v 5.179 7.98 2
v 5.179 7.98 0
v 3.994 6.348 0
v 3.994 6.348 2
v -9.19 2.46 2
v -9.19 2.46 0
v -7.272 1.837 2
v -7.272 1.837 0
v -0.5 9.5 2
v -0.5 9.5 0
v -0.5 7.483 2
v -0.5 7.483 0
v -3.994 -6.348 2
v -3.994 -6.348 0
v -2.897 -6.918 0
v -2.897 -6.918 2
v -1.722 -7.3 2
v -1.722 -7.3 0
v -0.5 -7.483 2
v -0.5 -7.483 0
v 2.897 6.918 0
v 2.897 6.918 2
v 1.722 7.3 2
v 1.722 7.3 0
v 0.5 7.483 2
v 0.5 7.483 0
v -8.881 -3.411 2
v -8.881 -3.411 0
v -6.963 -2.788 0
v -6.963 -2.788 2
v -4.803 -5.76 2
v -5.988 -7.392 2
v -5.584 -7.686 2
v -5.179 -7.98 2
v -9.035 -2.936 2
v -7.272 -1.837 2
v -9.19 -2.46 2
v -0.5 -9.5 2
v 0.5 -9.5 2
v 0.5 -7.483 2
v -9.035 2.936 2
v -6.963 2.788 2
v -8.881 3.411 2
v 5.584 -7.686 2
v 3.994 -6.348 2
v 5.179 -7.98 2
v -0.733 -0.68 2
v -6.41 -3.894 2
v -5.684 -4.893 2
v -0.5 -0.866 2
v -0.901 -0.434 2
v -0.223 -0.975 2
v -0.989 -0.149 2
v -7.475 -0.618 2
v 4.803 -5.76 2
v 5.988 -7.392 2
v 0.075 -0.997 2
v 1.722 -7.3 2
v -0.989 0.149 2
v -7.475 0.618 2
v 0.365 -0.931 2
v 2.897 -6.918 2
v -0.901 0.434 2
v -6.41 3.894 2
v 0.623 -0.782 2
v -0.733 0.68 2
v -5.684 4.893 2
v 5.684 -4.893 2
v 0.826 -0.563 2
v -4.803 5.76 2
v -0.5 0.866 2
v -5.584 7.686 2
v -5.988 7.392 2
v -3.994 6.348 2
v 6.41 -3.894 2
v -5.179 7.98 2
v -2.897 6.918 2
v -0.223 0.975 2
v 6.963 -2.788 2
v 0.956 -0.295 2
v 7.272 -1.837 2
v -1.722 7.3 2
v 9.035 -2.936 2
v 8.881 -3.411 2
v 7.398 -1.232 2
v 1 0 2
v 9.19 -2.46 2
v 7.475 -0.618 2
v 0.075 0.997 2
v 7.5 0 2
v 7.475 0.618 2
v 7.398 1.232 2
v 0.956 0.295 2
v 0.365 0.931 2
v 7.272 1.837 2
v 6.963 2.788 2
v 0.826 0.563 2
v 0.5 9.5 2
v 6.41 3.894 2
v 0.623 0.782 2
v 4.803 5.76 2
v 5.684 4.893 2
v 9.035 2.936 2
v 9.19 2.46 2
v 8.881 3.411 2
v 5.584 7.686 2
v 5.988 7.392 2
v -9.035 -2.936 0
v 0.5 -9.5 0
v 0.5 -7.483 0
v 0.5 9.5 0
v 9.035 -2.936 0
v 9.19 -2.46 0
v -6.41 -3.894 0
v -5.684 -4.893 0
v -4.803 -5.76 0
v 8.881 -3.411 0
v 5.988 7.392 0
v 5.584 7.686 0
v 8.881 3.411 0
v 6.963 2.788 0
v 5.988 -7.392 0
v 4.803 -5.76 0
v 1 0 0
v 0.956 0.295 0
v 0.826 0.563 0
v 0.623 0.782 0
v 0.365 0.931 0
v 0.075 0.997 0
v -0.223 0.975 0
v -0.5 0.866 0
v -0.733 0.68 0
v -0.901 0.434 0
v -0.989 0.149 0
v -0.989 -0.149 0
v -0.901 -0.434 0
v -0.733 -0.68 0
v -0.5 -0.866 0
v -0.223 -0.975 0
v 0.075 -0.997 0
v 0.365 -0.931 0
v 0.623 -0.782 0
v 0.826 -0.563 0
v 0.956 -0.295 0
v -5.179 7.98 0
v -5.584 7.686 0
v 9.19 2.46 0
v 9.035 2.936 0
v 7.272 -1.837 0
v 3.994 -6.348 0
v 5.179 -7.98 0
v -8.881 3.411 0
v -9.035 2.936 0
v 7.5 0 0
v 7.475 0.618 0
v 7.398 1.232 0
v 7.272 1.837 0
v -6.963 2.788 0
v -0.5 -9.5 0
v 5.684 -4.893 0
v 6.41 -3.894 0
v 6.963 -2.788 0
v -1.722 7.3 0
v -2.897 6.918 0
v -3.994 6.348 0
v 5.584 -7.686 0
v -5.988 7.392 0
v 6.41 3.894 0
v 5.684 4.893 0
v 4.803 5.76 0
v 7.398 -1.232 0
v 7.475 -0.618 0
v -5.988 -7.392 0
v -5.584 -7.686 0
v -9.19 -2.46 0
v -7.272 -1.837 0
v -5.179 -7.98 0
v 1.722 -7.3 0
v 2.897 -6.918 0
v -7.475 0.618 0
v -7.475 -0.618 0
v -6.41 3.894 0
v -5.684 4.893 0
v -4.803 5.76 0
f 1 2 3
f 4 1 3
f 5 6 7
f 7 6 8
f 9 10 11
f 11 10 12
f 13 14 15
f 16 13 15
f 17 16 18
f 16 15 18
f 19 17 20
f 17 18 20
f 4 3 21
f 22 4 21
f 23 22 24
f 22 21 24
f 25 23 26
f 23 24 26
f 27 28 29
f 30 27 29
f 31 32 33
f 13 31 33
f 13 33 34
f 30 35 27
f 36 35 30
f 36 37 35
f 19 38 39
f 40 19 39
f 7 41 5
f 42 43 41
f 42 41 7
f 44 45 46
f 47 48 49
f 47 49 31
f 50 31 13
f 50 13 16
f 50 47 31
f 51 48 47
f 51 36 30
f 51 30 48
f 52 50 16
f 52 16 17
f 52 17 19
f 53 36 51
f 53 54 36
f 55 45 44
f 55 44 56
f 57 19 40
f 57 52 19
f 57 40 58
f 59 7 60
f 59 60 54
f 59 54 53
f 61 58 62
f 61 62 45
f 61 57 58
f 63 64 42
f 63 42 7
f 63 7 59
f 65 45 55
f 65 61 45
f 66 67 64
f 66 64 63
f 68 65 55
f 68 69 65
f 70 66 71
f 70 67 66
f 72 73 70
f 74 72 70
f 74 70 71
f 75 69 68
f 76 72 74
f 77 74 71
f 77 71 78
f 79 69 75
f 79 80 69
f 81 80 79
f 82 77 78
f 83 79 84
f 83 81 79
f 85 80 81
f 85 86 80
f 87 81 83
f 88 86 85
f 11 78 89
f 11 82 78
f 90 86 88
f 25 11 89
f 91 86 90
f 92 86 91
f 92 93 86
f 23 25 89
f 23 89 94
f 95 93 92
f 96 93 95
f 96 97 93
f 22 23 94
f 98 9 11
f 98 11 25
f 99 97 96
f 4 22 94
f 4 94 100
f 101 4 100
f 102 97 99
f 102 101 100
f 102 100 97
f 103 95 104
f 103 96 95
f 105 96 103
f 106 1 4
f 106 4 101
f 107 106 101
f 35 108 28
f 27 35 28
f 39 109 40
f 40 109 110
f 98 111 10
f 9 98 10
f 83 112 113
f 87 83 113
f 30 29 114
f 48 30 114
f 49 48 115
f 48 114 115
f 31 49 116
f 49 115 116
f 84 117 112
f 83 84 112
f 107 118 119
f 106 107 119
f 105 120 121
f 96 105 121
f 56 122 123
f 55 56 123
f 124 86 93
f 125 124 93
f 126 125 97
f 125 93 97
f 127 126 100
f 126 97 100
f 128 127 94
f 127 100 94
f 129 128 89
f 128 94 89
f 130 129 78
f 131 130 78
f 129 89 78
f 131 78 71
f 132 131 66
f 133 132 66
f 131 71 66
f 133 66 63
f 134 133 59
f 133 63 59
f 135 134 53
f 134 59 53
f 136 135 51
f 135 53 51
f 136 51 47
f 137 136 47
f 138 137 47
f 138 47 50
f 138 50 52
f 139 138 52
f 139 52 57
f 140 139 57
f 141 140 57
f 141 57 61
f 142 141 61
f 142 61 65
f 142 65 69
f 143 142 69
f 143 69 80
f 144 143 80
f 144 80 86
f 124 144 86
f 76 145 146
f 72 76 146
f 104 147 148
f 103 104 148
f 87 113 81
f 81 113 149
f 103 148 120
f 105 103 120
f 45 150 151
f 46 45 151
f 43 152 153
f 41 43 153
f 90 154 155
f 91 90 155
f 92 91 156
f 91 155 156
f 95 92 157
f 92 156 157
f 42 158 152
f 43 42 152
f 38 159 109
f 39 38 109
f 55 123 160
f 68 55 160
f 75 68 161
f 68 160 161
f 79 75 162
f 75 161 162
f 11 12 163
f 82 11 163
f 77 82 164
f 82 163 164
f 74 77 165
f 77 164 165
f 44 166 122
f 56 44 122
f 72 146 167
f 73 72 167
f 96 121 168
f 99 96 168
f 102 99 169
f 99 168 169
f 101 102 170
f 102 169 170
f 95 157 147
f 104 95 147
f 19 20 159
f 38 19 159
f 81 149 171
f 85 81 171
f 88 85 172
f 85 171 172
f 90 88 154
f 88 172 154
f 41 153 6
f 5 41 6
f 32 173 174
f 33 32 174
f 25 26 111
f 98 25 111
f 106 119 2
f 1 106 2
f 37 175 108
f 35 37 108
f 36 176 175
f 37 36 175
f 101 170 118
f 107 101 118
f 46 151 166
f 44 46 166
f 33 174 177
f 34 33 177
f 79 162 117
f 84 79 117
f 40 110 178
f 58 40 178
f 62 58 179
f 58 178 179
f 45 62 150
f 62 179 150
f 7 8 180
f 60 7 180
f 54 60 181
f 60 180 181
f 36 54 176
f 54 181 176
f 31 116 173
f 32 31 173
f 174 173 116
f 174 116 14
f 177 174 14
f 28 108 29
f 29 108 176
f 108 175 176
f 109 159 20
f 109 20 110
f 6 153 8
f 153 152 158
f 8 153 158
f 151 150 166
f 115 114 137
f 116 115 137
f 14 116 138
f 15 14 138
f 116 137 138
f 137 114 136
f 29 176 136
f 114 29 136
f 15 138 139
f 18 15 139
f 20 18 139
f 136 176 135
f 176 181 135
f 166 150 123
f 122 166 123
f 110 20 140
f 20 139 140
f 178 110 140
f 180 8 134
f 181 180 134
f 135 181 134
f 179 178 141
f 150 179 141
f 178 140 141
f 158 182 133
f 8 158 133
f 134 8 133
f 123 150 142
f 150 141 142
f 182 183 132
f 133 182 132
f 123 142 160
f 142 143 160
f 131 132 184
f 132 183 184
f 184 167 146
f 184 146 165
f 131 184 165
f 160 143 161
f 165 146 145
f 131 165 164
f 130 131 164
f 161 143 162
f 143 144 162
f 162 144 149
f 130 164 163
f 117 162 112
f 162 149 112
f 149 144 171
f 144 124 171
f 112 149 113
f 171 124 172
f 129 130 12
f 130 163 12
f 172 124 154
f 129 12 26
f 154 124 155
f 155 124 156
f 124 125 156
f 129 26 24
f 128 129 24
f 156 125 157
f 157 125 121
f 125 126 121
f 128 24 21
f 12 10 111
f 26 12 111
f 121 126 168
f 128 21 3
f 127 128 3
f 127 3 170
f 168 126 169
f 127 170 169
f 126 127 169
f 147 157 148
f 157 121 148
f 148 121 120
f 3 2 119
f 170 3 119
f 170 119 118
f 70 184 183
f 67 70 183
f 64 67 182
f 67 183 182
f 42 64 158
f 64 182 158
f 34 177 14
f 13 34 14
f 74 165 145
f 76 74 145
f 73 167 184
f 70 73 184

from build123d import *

# Parameters (mm, degrees)
F1_DEPTH = 2
F2_R     = 1
F3_DEPTH = 2.001


with BuildPart() as f1:
    # F0 (on Top) → F1 (new body)
    with BuildSketch(Plane.XY):
        with BuildLine():
            ThreePointArc((7.271564, -1.836943), (7.442672, -0.925546), (7.5, 0))
            ThreePointArc((7.5, 0), (7.442672, 0.925546), (7.271564, 1.836943))
            ThreePointArc((7.271564, 1.836943), (7.132924, 2.317627), (6.962547, 2.788))
            ThreePointArc((6.962547, 2.788), (6.067627, 4.408389), (4.803091, 5.760236))
            ThreePointArc((4.803091, 5.760236), (4.408389, 6.067627), (3.994074, 6.348021))
            ThreePointArc((3.994074, 6.348021), (2.317627, 7.132924), (0.5, 7.483315))
            ThreePointArc((0.5, 7.483315), (0, 7.5), (-0.5, 7.483315))
            ThreePointArc((-0.5, 7.483315), (-2.317627, 7.132924), (-3.994074, 6.348021))
            ThreePointArc((-3.994074, 6.348021), (-4.408389, 6.067627), (-4.803091, 5.760236))
            ThreePointArc((-4.803091, 5.760236), (-6.067627, 4.408389), (-6.962547, 2.788))
            ThreePointArc((-6.962547, 2.788), (-7.132924, 2.317627), (-7.271564, 1.836943))
            ThreePointArc((-7.271564, 1.836943), (-7.5, 0), (-7.271564, -1.836943))
            ThreePointArc((-7.271564, -1.836943), (-7.132924, -2.317627), (-6.962547, -2.788))
            ThreePointArc((-6.962547, -2.788), (-6.067627, -4.408389), (-4.803091, -5.760236))
            ThreePointArc((-4.803091, -5.760236), (-4.408389, -6.067627), (-3.994074, -6.348021))
            ThreePointArc((-3.994074, -6.348021), (-2.317627, -7.132924), (-0.5, -7.483315))
            ThreePointArc((-0.5, -7.483315), (0, -7.5), (0.5, -7.483315))
            ThreePointArc((0.5, -7.483315), (2.317627, -7.132924), (3.994074, -6.348021))
            ThreePointArc((3.994074, -6.348021), (4.408389, -6.067627), (4.803091, -5.760236))
            ThreePointArc((4.803091, -5.760236), (6.067627, -4.408389), (6.962547, -2.788))
            ThreePointArc((6.962547, -2.788), (7.132924, -2.317627), (7.271564, -1.836943))
        make_face()
        with BuildLine():
            ThreePointArc((6.962547, 2.788), (7.132924, 2.317627), (7.271564, 1.836943))
            Line((7.271564, 1.836943), (9.189545, 2.460133))
            Line((9.189545, 2.460133), (9.035037, 2.935661))
            Line((9.035037, 2.935661), (8.880528, 3.41119))
            Line((8.880528, 3.41119), (6.962547, 2.788))
        make_face()
        with BuildLine():
            Line((9.189545, -2.460133), (7.271564, -1.836943))
            ThreePointArc((7.271564, -1.836943), (7.132924, -2.317627), (6.962547, -2.788))
            Line((6.962547, -2.788), (8.880528, -3.41119))
            Line((8.880528, -3.41119), (9.035037, -2.935661))
            Line((9.035037, -2.935661), (9.189545, -2.460133))
        make_face()
        with BuildLine():
            ThreePointArc((3.994074, 6.348021), (4.408389, 6.067627), (4.803091, 5.760236))
            Line((4.803091, 5.760236), (5.988468, 7.391769))
            Line((5.988468, 7.391769), (5.58396, 7.685661))
            Line((5.58396, 7.685661), (5.179451, 7.979554))
            Line((5.179451, 7.979554), (3.994074, 6.348021))
        make_face()
        with BuildLine():
            Line((5.988468, -7.391769), (4.803091, -5.760236))
            ThreePointArc((4.803091, -5.760236), (4.408389, -6.067627), (3.994074, -6.348021))
            Line((3.994074, -6.348021), (5.179451, -7.979554))
            Line((5.179451, -7.979554), (5.58396, -7.685661))
            Line((5.58396, -7.685661), (5.988468, -7.391769))
        make_face()
        with BuildLine():
            ThreePointArc((-0.5, 7.483315), (0, 7.5), (0.5, 7.483315))
            Line((0.5, 7.483315), (0.5, 9.5))
            Line((0.5, 9.5), (0, 9.5))
            Line((0, 9.5), (-0.5, 9.5))
            Line((-0.5, 9.5), (-0.5, 7.483315))
        make_face()
        with BuildLine():
            Line((0.5, -9.5), (0.5, -7.483315))
            ThreePointArc((0.5, -7.483315), (0, -7.5), (-0.5, -7.483315))
            Line((-0.5, -7.483315), (-0.5, -9.5))
            Line((-0.5, -9.5), (0, -9.5))
            Line((0, -9.5), (0.5, -9.5))
        make_face()
        with BuildLine():
            ThreePointArc((-4.803091, 5.760236), (-4.408389, 6.067627), (-3.994074, 6.348021))
            Line((-3.994074, 6.348021), (-5.179451, 7.979554))
            Line((-5.179451, 7.979554), (-5.58396, 7.685661))
            Line((-5.58396, 7.685661), (-5.988468, 7.391769))
            Line((-5.988468, 7.391769), (-4.803091, 5.760236))
        make_face()
        with BuildLine():
            Line((-5.179451, -7.979554), (-3.994074, -6.348021))
            ThreePointArc((-3.994074, -6.348021), (-4.408389, -6.067627), (-4.803091, -5.760236))
            Line((-4.803091, -5.760236), (-5.988468, -7.391769))
            Line((-5.988468, -7.391769), (-5.58396, -7.685661))
            Line((-5.58396, -7.685661), (-5.179451, -7.979554))
        make_face()
        with BuildLine():
            ThreePointArc((-7.271564, 1.836943), (-7.132924, 2.317627), (-6.962547, 2.788))
            Line((-6.962547, 2.788), (-8.880528, 3.41119))
            Line((-8.880528, 3.41119), (-9.035037, 2.935661))
            Line((-9.035037, 2.935661), (-9.189545, 2.460133))
            Line((-9.189545, 2.460133), (-7.271564, 1.836943))
        make_face()
        with BuildLine():
            Line((-8.880528, -3.41119), (-6.962547, -2.788))
            ThreePointArc((-6.962547, -2.788), (-7.132924, -2.317627), (-7.271564, -1.836943))
            Line((-7.271564, -1.836943), (-9.189545, -2.460133))
            Line((-9.189545, -2.460133), (-9.035037, -2.935661))
            Line((-9.035037, -2.935661), (-8.880528, -3.41119))
        make_face()
    extrude(amount=F1_DEPTH)

    # F2 (on face) → F3 (cut, through all)
    with BuildSketch(Plane.XY.offset(2)):
        Circle(F2_R)
    extrude(amount=-F3_DEPTH, mode=Mode.SUBTRACT)


solid = f1.part
